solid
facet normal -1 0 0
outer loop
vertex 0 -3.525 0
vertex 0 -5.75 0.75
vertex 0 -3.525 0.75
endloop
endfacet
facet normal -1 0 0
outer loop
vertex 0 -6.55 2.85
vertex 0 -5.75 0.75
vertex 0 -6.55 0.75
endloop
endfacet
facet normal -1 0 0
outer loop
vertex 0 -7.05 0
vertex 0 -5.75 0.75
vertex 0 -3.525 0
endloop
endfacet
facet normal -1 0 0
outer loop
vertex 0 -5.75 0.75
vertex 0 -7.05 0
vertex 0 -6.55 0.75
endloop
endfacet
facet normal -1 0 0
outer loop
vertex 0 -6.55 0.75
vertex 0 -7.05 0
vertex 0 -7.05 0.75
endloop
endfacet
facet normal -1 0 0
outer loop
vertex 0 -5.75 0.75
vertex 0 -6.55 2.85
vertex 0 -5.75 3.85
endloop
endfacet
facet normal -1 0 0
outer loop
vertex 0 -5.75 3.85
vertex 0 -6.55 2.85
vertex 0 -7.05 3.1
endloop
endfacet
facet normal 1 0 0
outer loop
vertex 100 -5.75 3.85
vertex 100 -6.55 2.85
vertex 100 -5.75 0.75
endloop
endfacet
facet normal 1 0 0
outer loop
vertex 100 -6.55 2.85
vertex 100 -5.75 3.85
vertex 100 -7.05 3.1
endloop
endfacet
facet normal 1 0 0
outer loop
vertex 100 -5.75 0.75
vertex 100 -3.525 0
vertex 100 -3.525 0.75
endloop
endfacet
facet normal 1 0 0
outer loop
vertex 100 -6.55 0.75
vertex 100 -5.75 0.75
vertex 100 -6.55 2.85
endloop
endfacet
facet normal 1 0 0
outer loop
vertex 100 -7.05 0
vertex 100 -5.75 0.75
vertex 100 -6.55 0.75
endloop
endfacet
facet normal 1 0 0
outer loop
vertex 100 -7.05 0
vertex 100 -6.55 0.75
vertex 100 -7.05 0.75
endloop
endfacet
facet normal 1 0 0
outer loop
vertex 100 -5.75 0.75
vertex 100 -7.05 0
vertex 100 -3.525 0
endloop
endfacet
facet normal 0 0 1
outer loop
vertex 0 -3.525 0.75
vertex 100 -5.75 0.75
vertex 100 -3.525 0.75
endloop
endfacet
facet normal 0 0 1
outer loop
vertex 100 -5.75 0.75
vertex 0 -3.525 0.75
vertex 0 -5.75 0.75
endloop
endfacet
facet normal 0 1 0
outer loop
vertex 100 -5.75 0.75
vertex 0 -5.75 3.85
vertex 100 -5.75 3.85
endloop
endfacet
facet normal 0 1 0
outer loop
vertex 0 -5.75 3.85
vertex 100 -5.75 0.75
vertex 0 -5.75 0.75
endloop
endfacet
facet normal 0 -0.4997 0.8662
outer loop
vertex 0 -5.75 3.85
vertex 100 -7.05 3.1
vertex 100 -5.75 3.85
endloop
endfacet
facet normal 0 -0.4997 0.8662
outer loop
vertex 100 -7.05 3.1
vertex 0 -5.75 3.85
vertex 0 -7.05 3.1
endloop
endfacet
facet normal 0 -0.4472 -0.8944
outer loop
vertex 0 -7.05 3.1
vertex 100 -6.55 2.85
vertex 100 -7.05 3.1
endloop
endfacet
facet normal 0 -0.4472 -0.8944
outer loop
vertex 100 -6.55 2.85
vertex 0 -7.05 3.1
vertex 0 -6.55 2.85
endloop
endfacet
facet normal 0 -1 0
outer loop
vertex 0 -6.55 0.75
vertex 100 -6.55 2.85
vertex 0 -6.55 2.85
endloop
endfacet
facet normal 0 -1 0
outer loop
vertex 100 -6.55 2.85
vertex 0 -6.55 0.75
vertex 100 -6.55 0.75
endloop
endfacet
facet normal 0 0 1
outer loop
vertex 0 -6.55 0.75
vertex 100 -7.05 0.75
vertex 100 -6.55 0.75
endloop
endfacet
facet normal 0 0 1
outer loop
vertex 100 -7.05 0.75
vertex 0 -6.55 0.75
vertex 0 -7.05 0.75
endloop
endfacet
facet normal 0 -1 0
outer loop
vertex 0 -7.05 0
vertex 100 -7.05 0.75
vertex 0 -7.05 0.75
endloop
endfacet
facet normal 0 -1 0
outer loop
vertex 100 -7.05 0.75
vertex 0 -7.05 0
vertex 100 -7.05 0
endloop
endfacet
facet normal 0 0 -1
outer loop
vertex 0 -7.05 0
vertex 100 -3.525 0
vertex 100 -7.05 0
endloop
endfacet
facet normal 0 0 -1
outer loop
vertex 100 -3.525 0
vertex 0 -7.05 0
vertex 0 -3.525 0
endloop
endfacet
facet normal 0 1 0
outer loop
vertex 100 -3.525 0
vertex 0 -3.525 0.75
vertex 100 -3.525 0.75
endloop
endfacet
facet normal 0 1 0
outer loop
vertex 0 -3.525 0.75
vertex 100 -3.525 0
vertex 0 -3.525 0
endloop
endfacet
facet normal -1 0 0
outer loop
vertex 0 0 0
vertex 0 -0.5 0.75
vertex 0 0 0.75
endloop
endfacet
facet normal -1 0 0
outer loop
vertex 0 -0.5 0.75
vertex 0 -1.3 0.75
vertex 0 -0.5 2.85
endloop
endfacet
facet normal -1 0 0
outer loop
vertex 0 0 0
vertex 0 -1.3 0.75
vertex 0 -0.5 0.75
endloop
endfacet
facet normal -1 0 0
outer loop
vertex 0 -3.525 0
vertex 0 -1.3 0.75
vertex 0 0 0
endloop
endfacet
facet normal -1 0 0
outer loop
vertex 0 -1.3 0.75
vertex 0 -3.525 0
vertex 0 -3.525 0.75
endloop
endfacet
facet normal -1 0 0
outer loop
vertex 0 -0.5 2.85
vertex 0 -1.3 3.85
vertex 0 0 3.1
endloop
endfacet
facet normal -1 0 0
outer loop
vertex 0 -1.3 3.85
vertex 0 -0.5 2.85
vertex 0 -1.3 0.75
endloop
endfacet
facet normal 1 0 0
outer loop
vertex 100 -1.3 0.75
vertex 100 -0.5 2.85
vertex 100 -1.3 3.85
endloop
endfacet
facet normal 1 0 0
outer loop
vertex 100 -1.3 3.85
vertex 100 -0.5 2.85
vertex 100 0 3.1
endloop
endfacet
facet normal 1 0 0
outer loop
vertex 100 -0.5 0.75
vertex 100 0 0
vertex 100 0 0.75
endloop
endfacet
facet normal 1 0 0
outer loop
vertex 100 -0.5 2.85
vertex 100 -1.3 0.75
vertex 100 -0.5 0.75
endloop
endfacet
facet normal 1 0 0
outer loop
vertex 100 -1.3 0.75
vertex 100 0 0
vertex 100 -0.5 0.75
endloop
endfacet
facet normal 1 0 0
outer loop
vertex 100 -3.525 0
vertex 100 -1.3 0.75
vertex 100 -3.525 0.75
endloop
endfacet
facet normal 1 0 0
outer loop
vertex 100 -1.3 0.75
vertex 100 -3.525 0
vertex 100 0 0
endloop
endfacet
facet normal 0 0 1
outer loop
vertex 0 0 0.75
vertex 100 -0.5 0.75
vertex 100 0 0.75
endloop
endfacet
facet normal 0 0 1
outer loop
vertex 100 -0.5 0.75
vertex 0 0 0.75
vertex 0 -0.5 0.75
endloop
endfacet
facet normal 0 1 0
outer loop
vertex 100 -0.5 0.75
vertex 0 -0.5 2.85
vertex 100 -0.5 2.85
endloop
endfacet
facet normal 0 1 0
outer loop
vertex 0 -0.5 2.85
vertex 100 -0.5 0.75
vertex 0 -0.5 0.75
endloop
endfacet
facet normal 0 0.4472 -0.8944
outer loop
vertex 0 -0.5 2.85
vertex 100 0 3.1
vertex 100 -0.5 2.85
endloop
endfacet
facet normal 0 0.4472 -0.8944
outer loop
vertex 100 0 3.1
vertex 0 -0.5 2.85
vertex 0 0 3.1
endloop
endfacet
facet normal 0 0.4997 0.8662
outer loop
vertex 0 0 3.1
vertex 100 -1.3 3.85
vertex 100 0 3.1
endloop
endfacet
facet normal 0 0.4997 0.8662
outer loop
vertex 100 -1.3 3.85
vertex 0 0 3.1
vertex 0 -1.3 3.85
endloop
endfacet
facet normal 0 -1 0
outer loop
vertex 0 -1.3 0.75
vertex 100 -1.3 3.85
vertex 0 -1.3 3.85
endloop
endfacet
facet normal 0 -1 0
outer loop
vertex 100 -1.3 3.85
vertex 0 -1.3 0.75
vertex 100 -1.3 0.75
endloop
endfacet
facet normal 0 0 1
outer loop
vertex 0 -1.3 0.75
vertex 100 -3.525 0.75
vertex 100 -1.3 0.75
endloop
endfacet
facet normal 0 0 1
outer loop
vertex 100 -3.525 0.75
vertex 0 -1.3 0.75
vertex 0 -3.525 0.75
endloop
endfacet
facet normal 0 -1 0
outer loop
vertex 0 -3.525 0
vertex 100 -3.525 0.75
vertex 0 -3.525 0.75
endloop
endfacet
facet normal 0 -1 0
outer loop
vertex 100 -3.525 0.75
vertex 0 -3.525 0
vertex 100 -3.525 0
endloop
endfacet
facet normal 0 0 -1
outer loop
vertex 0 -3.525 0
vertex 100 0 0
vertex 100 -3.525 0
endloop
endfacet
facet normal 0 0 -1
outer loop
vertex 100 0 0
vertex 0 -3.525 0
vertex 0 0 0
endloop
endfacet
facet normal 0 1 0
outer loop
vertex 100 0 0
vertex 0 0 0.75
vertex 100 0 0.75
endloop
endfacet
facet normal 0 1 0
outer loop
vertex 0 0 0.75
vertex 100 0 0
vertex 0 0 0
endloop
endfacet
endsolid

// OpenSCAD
/*
    Author: Daniel Devine
    Date: 13/01/17
    Description: T-Slot aluminium cover for the extrusions used for the Anet A2.
    Particularly useful for running the x-axis endstop wire separately from the X-axis belt.
    Either adjust the length in the OpenSCAD file or stretch along the x-axis in your slicer.
*/

length = 100; // The length of the extrusion.
base_width = 7.05;
base_thickness = 0.75;
sidewall_thickness = 0.8;
sidewall_offset = 0.5;
part_height = 4.6;
un_overhang = 0.25; // 0.25 prints better, but 0 would be optimal for functionality.

// Build the object
rotate([90, 0, 90]){
    union(){
        // First half
        translate([-(base_width), 0, 0]){
            linear_extrude(length) half_extrusion();
        };
        // Second half
        linear_extrude(length) mirror([1, 0, 0]) half_extrusion();
    }   
}
        


module half_extrusion(){
    // Half the extrusion is modelled so that there is less description of the polygon needed.
    polygon(points=[
            [0,0], // origin 
            [base_width/2, 0],
            [base_width/2 , base_thickness],
            [sidewall_offset + sidewall_thickness, base_thickness],
            [sidewall_offset + sidewall_thickness, part_height - base_thickness], // This is the highest point.
            [0, part_height - (sidewall_thickness * 1.875)], // Down roughly 45deg to make a point that sticks out to anchor under lip of extrusion Multiply sidewall by 1.8 to keep linear?
            [sidewall_offset, part_height - (sidewall_thickness * 1.875) - un_overhang], // back in...
            [sidewall_offset, base_thickness],
            [0, base_thickness],
            [0, 0]
        ]
    );
}
